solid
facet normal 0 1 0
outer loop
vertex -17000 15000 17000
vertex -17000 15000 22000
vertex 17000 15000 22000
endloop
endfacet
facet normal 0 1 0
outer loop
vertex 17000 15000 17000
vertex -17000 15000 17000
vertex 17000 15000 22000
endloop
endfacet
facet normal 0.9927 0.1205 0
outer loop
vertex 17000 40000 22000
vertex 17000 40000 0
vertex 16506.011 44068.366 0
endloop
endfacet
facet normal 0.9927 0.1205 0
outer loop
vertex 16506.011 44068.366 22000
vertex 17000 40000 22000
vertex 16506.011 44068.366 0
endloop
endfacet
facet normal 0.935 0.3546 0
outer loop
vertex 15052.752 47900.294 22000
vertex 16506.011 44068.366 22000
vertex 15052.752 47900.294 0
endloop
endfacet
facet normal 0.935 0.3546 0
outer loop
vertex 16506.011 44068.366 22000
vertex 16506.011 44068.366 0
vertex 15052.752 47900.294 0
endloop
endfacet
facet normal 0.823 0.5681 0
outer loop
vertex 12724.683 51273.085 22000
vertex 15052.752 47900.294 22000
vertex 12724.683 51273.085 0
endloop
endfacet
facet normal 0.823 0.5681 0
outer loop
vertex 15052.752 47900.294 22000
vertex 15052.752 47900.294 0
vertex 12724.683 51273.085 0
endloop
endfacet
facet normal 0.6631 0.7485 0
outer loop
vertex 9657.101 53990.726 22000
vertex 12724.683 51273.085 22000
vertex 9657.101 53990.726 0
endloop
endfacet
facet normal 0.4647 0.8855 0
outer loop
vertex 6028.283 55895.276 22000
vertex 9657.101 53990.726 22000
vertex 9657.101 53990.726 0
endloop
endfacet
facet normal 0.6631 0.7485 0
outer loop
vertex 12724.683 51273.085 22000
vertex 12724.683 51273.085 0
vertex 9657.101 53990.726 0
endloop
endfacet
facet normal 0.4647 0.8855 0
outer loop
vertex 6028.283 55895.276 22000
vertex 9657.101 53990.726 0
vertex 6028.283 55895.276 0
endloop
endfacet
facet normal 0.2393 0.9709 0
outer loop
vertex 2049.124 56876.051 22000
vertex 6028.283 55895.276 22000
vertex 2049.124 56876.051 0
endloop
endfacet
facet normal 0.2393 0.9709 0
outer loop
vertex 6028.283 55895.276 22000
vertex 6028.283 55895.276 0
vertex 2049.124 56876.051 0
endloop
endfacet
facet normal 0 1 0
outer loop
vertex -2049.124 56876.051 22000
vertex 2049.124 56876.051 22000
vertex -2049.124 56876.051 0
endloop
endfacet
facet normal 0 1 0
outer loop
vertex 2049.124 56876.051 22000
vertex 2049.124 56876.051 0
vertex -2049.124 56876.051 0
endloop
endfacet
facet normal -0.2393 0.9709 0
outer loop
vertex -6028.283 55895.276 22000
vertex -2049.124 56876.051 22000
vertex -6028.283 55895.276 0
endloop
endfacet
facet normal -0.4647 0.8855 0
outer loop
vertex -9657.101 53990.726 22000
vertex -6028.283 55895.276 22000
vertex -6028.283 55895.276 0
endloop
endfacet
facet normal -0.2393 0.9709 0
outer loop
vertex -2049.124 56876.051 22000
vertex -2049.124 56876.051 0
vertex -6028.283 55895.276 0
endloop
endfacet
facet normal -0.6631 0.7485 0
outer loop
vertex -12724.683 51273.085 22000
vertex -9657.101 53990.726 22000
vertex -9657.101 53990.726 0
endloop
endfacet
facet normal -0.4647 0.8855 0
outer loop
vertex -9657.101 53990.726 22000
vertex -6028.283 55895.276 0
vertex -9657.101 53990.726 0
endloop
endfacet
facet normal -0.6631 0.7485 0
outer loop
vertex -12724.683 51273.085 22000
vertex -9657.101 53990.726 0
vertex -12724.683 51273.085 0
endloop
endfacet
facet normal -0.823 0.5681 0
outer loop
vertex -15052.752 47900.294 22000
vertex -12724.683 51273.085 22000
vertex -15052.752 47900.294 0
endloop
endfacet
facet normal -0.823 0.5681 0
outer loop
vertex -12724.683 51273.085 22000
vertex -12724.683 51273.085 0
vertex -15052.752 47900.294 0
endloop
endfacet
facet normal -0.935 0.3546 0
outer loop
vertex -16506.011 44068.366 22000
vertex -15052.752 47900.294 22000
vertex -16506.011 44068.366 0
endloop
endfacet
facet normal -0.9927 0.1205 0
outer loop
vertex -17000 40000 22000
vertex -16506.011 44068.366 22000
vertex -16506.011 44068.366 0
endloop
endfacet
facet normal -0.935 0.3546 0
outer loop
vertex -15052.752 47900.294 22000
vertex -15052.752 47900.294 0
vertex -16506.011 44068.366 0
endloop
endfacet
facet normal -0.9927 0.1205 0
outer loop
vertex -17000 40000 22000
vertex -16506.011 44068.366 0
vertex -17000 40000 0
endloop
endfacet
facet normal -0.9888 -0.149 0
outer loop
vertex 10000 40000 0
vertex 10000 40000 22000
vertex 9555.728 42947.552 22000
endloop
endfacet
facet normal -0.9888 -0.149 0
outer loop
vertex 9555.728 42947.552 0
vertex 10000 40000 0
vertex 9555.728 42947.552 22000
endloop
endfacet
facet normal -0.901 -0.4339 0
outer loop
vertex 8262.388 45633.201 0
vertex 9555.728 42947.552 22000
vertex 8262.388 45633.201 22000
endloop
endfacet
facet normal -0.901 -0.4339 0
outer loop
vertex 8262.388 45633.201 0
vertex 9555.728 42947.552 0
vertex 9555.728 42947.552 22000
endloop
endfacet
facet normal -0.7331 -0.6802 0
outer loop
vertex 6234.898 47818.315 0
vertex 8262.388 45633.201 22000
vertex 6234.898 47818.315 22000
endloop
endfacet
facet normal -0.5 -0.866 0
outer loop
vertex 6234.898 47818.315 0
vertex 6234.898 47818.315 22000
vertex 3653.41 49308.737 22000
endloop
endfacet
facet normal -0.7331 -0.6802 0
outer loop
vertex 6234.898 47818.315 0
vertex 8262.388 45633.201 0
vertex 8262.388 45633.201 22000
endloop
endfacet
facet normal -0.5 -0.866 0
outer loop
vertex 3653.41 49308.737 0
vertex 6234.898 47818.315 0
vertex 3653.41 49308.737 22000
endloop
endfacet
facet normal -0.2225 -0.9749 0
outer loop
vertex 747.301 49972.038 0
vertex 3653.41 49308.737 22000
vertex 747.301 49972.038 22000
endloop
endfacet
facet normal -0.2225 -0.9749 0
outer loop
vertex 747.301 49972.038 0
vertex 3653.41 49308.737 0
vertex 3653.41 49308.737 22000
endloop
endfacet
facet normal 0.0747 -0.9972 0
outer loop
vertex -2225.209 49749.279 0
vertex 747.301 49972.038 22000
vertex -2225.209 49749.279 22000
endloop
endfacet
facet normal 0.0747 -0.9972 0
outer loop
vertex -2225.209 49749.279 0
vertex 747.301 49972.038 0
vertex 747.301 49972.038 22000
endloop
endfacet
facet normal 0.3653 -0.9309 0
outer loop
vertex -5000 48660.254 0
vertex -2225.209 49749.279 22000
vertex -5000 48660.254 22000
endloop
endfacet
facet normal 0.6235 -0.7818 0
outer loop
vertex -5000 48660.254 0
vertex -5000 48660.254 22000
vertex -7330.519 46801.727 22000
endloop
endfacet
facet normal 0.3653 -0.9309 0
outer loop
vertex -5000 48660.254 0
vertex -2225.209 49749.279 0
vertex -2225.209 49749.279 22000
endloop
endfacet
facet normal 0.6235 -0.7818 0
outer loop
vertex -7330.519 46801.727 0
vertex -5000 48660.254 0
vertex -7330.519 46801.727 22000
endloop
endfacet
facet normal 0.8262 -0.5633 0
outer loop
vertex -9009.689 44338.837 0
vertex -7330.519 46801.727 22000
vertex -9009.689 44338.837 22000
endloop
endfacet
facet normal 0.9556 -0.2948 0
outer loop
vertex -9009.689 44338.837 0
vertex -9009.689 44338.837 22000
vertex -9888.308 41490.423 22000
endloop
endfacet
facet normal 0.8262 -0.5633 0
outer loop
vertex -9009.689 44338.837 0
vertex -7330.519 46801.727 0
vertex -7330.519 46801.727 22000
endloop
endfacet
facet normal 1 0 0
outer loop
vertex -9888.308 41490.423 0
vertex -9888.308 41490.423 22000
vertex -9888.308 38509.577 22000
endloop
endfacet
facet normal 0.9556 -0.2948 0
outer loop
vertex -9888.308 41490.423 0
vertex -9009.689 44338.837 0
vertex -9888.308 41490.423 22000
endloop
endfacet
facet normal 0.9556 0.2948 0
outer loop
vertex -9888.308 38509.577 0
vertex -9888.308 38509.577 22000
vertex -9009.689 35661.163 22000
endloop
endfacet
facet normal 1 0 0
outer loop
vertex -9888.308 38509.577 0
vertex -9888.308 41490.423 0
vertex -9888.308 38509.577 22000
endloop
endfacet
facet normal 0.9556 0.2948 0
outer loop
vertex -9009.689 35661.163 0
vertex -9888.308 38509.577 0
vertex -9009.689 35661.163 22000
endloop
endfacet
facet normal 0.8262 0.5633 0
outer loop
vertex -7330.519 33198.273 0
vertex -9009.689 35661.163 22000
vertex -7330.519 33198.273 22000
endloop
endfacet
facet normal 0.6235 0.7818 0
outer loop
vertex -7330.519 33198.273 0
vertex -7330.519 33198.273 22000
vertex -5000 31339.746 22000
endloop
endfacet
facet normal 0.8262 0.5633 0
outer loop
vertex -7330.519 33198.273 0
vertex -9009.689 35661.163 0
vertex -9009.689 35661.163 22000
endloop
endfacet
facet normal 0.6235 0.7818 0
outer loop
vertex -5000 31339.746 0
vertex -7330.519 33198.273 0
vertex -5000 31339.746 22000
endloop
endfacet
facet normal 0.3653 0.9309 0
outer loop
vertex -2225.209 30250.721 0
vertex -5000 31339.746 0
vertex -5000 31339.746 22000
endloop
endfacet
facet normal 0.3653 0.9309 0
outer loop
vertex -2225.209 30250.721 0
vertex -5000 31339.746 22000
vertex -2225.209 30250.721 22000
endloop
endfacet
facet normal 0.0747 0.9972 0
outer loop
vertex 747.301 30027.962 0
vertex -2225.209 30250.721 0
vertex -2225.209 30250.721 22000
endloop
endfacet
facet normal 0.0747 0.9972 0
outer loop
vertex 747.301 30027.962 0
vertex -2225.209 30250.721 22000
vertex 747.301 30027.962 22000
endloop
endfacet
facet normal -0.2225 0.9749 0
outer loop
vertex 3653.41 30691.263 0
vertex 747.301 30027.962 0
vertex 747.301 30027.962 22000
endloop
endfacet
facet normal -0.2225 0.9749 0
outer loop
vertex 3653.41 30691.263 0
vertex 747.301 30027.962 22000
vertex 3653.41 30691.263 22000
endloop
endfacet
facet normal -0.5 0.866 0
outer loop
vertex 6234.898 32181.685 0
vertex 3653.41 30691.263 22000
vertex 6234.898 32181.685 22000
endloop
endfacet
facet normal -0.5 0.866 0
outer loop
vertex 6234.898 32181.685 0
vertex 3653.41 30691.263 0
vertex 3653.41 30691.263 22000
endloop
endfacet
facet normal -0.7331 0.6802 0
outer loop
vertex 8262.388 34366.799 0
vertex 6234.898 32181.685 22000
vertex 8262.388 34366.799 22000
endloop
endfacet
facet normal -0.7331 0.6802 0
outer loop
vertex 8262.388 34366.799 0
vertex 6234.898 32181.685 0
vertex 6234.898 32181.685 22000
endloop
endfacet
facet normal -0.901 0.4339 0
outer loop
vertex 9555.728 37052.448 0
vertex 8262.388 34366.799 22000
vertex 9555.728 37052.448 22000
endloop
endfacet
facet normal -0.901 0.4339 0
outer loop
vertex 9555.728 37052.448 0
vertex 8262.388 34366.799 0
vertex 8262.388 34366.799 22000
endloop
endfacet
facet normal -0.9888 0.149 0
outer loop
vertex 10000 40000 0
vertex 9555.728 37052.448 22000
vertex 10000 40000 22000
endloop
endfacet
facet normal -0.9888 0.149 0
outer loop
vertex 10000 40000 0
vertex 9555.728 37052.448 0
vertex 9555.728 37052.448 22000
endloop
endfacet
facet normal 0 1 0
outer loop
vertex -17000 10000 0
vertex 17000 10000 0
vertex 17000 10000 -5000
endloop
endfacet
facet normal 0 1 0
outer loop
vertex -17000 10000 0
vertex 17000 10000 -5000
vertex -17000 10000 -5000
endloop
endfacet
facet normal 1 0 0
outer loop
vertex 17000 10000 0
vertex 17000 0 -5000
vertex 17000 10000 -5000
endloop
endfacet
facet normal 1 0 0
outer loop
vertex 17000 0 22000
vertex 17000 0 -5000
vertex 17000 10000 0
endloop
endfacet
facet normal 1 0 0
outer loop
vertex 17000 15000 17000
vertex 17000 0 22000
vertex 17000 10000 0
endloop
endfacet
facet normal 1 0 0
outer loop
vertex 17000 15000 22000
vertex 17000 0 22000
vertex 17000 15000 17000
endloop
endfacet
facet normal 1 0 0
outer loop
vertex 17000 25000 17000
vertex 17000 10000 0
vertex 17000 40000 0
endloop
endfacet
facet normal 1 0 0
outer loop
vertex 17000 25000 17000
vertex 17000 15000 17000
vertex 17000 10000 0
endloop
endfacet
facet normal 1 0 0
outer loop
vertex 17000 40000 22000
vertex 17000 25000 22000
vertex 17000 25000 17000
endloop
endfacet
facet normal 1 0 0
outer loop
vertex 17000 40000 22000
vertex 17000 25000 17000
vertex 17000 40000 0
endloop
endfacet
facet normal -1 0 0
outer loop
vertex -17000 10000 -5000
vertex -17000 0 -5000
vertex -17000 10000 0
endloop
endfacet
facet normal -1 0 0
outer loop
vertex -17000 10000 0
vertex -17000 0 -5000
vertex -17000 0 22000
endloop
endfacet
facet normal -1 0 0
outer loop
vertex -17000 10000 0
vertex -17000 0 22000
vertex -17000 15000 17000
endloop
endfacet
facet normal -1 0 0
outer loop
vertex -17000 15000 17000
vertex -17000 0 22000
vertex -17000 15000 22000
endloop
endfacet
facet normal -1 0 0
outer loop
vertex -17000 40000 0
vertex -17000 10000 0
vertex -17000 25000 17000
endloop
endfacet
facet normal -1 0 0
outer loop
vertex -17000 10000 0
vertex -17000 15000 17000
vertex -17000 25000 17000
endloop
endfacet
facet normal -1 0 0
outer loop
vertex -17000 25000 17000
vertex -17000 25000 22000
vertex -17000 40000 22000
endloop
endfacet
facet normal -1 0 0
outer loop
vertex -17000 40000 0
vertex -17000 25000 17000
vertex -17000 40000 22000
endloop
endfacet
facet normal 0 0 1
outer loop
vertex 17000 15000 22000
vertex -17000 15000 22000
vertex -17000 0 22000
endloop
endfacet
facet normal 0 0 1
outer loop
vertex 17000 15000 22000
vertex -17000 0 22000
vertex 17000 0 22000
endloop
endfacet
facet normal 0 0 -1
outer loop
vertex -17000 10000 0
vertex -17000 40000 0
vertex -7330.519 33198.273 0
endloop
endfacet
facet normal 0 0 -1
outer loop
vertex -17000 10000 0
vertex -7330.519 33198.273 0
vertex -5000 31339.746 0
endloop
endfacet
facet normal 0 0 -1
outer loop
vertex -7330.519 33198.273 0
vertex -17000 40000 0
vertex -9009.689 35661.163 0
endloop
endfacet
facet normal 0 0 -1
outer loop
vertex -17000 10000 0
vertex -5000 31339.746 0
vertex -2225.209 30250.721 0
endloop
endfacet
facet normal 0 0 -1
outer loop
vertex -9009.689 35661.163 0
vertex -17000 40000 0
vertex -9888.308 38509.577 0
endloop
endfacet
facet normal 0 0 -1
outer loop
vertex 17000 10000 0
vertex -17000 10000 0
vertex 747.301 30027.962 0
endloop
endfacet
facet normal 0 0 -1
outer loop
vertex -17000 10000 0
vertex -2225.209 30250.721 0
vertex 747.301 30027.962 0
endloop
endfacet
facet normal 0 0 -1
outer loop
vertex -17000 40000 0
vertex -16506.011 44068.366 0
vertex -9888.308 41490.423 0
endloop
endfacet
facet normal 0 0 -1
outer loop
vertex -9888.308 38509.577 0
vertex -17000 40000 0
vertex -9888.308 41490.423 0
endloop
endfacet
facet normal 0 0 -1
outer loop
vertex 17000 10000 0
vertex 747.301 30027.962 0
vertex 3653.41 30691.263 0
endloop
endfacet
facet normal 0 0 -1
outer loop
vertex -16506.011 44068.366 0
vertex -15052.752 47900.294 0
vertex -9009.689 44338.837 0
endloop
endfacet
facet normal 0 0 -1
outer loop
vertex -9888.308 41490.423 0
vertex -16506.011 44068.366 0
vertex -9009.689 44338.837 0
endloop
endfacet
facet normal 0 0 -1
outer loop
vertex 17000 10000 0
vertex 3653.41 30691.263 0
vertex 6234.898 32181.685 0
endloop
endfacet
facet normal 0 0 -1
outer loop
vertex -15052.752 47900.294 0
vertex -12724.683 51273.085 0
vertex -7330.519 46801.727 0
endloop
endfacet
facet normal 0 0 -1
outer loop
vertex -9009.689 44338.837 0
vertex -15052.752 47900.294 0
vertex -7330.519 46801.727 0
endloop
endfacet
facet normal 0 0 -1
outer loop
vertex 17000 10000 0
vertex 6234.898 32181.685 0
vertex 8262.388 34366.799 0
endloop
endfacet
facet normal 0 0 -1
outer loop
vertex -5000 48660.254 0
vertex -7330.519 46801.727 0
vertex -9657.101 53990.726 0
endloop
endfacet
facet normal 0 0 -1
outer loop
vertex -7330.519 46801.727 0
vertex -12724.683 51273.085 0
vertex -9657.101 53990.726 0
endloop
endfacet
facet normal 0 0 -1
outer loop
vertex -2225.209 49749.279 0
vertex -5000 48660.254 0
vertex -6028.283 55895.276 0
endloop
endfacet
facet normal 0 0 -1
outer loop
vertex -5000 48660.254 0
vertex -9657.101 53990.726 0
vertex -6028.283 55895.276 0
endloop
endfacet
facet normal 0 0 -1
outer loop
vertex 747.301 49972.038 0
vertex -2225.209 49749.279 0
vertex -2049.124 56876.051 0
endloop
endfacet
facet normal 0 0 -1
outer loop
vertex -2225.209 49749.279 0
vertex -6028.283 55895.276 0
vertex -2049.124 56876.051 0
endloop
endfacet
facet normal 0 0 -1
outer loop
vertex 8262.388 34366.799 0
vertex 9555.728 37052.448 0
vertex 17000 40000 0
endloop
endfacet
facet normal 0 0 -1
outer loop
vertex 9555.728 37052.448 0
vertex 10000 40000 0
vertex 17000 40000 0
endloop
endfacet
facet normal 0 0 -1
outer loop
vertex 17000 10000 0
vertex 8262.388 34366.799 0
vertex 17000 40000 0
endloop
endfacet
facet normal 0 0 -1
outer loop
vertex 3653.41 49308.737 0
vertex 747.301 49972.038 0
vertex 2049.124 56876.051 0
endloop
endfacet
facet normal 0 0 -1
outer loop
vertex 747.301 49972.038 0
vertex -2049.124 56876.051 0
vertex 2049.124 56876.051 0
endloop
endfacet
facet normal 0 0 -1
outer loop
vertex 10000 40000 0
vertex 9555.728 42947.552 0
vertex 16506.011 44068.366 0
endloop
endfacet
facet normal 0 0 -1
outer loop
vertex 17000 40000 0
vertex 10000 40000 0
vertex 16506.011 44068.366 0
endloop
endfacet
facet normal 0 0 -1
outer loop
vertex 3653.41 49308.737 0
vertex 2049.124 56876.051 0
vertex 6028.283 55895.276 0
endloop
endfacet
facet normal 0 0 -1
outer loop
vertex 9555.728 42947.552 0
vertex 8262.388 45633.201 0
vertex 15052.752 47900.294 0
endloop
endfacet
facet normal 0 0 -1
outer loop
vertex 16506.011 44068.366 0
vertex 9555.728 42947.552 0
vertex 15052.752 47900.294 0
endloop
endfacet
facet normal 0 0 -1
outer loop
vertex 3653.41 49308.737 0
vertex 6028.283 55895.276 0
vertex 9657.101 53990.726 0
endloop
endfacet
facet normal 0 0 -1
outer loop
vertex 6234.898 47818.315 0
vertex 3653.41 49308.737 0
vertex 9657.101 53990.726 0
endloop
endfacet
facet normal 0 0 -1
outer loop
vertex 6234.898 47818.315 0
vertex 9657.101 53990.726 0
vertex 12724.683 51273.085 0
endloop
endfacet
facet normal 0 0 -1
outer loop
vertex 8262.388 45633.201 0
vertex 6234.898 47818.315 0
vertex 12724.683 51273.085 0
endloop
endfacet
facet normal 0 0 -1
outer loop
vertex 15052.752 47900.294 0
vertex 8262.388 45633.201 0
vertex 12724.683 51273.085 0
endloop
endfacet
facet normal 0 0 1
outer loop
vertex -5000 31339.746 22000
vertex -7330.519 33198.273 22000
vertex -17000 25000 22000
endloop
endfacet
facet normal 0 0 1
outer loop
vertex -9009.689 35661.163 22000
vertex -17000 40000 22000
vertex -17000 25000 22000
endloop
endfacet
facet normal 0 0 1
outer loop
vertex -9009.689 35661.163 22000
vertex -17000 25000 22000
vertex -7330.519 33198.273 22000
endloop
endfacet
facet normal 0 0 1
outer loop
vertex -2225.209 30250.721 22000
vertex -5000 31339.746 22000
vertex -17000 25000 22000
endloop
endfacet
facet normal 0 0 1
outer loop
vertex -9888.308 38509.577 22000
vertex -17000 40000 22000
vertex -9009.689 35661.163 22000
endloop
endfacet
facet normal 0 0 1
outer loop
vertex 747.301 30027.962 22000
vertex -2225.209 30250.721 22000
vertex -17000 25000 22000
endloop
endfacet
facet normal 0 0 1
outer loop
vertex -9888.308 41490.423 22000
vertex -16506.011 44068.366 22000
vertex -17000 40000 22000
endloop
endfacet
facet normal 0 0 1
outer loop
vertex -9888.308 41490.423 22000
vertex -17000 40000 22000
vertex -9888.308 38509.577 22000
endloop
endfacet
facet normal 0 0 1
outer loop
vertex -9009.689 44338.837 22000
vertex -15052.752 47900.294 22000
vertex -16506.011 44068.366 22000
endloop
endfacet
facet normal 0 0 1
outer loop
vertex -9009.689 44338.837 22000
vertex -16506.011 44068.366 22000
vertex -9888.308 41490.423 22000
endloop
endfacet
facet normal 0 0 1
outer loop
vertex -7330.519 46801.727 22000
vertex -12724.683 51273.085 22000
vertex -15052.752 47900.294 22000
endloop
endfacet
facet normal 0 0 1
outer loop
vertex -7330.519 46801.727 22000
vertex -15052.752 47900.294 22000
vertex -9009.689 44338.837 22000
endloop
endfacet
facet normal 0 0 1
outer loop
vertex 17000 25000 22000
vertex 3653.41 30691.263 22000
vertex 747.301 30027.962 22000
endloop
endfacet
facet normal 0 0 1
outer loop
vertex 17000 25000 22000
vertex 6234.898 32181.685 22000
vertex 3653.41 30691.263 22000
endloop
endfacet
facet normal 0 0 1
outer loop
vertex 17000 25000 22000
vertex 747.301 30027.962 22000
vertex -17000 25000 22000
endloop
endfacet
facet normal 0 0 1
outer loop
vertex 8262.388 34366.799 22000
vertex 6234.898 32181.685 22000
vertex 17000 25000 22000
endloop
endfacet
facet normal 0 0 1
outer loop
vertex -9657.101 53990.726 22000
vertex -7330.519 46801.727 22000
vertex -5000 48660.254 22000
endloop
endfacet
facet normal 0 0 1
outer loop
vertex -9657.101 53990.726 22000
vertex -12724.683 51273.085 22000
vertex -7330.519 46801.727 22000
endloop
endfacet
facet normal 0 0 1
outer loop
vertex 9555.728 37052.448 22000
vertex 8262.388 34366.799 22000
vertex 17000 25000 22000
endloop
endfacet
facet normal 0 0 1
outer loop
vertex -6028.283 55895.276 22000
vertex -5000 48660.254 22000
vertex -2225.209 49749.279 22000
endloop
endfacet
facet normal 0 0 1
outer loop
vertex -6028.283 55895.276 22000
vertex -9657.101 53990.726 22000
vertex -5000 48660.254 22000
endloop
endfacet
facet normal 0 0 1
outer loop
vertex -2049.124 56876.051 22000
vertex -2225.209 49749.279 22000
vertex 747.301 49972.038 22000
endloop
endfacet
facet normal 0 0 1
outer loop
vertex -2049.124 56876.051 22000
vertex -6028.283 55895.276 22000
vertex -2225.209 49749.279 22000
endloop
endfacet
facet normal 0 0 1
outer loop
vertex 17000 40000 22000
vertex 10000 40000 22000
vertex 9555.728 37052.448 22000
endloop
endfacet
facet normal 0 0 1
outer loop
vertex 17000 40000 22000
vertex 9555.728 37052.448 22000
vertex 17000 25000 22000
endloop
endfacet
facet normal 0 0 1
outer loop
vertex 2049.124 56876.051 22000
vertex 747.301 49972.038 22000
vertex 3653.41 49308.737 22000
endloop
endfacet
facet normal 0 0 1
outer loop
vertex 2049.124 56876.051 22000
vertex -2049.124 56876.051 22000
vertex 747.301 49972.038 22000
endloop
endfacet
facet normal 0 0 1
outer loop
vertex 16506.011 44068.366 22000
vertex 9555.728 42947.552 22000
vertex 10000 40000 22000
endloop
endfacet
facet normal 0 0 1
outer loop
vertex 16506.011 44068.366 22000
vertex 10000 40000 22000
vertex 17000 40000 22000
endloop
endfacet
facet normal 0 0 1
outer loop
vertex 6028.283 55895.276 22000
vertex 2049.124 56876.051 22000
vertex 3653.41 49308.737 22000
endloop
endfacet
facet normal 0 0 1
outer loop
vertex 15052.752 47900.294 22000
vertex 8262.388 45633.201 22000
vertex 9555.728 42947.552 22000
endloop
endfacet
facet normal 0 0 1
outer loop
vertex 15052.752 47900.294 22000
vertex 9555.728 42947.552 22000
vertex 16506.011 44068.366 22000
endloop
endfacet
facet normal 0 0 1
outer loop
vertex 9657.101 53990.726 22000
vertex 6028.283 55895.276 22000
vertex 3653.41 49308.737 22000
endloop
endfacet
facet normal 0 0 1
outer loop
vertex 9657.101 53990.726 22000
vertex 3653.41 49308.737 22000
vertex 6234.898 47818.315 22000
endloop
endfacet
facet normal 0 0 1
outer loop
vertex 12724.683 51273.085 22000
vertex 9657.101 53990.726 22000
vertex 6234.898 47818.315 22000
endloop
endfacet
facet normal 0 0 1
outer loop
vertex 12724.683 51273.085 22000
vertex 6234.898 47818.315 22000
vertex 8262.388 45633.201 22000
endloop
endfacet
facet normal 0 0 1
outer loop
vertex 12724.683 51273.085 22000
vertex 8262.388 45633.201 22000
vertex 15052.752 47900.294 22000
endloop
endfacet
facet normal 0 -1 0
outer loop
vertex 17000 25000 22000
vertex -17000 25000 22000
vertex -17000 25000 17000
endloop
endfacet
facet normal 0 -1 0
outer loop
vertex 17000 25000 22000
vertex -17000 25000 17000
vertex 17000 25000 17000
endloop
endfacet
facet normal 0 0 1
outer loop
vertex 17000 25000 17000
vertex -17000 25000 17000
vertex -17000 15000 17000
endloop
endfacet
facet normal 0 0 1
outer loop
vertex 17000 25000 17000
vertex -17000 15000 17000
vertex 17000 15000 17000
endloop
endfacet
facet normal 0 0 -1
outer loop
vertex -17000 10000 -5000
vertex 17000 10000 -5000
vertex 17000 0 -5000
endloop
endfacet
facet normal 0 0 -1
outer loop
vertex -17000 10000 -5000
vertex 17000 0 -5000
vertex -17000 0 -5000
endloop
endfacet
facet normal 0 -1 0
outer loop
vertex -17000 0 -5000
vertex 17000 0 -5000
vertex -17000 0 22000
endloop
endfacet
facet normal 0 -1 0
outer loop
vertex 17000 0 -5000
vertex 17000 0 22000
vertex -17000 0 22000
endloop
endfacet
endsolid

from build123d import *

# Parameters (mm, degrees)
SKETCH1_R           = 10000
BOSS_EXTRUDE1_DEPTH = 22000
SKETCH2_W           = 34000
SKETCH2_H           = 10000
CUT_EXTRUDE1_DEPTH  = 5000
SKETCH3_W           = 34000
SKETCH3_H           = 10000
BOSS_EXTRUDE2_DEPTH = 5000


with BuildPart() as part:
    # Sketch1 → Boss-Extrude1 (new body)
    with BuildSketch(Plane.XY):
        with BuildLine():
            Line((-17000, 0), (17000, 0))
            Line((17000, 0), (17000, 40000))
            ThreePointArc((17000, 40000), (0, 57000), (-17000, 40000))
            Line((-17000, 40000), (-17000, 0))
        make_face()
        with Locations((0, 40000)):
            Circle(SKETCH1_R, mode=Mode.SUBTRACT)
    extrude(amount=BOSS_EXTRUDE1_DEPTH)

    # Sketch2 → Cut-Extrude1 (cut)
    with BuildSketch(Plane.XY.offset(22000)):
        with Locations((0, 20000)):
            Rectangle(SKETCH2_W, SKETCH2_H)
    extrude(amount=-CUT_EXTRUDE1_DEPTH, mode=Mode.SUBTRACT)

    # Sketch3 → Boss-Extrude2 (add)
    with BuildSketch(Plane(origin=(0, 0, 0), x_dir=(-1, 0, 0), z_dir=(0, 0, -1))):
        with Locations((0, 5000)):
            Rectangle(SKETCH3_W, SKETCH3_H)
    extrude(amount=BOSS_EXTRUDE2_DEPTH)


solid = part.part
